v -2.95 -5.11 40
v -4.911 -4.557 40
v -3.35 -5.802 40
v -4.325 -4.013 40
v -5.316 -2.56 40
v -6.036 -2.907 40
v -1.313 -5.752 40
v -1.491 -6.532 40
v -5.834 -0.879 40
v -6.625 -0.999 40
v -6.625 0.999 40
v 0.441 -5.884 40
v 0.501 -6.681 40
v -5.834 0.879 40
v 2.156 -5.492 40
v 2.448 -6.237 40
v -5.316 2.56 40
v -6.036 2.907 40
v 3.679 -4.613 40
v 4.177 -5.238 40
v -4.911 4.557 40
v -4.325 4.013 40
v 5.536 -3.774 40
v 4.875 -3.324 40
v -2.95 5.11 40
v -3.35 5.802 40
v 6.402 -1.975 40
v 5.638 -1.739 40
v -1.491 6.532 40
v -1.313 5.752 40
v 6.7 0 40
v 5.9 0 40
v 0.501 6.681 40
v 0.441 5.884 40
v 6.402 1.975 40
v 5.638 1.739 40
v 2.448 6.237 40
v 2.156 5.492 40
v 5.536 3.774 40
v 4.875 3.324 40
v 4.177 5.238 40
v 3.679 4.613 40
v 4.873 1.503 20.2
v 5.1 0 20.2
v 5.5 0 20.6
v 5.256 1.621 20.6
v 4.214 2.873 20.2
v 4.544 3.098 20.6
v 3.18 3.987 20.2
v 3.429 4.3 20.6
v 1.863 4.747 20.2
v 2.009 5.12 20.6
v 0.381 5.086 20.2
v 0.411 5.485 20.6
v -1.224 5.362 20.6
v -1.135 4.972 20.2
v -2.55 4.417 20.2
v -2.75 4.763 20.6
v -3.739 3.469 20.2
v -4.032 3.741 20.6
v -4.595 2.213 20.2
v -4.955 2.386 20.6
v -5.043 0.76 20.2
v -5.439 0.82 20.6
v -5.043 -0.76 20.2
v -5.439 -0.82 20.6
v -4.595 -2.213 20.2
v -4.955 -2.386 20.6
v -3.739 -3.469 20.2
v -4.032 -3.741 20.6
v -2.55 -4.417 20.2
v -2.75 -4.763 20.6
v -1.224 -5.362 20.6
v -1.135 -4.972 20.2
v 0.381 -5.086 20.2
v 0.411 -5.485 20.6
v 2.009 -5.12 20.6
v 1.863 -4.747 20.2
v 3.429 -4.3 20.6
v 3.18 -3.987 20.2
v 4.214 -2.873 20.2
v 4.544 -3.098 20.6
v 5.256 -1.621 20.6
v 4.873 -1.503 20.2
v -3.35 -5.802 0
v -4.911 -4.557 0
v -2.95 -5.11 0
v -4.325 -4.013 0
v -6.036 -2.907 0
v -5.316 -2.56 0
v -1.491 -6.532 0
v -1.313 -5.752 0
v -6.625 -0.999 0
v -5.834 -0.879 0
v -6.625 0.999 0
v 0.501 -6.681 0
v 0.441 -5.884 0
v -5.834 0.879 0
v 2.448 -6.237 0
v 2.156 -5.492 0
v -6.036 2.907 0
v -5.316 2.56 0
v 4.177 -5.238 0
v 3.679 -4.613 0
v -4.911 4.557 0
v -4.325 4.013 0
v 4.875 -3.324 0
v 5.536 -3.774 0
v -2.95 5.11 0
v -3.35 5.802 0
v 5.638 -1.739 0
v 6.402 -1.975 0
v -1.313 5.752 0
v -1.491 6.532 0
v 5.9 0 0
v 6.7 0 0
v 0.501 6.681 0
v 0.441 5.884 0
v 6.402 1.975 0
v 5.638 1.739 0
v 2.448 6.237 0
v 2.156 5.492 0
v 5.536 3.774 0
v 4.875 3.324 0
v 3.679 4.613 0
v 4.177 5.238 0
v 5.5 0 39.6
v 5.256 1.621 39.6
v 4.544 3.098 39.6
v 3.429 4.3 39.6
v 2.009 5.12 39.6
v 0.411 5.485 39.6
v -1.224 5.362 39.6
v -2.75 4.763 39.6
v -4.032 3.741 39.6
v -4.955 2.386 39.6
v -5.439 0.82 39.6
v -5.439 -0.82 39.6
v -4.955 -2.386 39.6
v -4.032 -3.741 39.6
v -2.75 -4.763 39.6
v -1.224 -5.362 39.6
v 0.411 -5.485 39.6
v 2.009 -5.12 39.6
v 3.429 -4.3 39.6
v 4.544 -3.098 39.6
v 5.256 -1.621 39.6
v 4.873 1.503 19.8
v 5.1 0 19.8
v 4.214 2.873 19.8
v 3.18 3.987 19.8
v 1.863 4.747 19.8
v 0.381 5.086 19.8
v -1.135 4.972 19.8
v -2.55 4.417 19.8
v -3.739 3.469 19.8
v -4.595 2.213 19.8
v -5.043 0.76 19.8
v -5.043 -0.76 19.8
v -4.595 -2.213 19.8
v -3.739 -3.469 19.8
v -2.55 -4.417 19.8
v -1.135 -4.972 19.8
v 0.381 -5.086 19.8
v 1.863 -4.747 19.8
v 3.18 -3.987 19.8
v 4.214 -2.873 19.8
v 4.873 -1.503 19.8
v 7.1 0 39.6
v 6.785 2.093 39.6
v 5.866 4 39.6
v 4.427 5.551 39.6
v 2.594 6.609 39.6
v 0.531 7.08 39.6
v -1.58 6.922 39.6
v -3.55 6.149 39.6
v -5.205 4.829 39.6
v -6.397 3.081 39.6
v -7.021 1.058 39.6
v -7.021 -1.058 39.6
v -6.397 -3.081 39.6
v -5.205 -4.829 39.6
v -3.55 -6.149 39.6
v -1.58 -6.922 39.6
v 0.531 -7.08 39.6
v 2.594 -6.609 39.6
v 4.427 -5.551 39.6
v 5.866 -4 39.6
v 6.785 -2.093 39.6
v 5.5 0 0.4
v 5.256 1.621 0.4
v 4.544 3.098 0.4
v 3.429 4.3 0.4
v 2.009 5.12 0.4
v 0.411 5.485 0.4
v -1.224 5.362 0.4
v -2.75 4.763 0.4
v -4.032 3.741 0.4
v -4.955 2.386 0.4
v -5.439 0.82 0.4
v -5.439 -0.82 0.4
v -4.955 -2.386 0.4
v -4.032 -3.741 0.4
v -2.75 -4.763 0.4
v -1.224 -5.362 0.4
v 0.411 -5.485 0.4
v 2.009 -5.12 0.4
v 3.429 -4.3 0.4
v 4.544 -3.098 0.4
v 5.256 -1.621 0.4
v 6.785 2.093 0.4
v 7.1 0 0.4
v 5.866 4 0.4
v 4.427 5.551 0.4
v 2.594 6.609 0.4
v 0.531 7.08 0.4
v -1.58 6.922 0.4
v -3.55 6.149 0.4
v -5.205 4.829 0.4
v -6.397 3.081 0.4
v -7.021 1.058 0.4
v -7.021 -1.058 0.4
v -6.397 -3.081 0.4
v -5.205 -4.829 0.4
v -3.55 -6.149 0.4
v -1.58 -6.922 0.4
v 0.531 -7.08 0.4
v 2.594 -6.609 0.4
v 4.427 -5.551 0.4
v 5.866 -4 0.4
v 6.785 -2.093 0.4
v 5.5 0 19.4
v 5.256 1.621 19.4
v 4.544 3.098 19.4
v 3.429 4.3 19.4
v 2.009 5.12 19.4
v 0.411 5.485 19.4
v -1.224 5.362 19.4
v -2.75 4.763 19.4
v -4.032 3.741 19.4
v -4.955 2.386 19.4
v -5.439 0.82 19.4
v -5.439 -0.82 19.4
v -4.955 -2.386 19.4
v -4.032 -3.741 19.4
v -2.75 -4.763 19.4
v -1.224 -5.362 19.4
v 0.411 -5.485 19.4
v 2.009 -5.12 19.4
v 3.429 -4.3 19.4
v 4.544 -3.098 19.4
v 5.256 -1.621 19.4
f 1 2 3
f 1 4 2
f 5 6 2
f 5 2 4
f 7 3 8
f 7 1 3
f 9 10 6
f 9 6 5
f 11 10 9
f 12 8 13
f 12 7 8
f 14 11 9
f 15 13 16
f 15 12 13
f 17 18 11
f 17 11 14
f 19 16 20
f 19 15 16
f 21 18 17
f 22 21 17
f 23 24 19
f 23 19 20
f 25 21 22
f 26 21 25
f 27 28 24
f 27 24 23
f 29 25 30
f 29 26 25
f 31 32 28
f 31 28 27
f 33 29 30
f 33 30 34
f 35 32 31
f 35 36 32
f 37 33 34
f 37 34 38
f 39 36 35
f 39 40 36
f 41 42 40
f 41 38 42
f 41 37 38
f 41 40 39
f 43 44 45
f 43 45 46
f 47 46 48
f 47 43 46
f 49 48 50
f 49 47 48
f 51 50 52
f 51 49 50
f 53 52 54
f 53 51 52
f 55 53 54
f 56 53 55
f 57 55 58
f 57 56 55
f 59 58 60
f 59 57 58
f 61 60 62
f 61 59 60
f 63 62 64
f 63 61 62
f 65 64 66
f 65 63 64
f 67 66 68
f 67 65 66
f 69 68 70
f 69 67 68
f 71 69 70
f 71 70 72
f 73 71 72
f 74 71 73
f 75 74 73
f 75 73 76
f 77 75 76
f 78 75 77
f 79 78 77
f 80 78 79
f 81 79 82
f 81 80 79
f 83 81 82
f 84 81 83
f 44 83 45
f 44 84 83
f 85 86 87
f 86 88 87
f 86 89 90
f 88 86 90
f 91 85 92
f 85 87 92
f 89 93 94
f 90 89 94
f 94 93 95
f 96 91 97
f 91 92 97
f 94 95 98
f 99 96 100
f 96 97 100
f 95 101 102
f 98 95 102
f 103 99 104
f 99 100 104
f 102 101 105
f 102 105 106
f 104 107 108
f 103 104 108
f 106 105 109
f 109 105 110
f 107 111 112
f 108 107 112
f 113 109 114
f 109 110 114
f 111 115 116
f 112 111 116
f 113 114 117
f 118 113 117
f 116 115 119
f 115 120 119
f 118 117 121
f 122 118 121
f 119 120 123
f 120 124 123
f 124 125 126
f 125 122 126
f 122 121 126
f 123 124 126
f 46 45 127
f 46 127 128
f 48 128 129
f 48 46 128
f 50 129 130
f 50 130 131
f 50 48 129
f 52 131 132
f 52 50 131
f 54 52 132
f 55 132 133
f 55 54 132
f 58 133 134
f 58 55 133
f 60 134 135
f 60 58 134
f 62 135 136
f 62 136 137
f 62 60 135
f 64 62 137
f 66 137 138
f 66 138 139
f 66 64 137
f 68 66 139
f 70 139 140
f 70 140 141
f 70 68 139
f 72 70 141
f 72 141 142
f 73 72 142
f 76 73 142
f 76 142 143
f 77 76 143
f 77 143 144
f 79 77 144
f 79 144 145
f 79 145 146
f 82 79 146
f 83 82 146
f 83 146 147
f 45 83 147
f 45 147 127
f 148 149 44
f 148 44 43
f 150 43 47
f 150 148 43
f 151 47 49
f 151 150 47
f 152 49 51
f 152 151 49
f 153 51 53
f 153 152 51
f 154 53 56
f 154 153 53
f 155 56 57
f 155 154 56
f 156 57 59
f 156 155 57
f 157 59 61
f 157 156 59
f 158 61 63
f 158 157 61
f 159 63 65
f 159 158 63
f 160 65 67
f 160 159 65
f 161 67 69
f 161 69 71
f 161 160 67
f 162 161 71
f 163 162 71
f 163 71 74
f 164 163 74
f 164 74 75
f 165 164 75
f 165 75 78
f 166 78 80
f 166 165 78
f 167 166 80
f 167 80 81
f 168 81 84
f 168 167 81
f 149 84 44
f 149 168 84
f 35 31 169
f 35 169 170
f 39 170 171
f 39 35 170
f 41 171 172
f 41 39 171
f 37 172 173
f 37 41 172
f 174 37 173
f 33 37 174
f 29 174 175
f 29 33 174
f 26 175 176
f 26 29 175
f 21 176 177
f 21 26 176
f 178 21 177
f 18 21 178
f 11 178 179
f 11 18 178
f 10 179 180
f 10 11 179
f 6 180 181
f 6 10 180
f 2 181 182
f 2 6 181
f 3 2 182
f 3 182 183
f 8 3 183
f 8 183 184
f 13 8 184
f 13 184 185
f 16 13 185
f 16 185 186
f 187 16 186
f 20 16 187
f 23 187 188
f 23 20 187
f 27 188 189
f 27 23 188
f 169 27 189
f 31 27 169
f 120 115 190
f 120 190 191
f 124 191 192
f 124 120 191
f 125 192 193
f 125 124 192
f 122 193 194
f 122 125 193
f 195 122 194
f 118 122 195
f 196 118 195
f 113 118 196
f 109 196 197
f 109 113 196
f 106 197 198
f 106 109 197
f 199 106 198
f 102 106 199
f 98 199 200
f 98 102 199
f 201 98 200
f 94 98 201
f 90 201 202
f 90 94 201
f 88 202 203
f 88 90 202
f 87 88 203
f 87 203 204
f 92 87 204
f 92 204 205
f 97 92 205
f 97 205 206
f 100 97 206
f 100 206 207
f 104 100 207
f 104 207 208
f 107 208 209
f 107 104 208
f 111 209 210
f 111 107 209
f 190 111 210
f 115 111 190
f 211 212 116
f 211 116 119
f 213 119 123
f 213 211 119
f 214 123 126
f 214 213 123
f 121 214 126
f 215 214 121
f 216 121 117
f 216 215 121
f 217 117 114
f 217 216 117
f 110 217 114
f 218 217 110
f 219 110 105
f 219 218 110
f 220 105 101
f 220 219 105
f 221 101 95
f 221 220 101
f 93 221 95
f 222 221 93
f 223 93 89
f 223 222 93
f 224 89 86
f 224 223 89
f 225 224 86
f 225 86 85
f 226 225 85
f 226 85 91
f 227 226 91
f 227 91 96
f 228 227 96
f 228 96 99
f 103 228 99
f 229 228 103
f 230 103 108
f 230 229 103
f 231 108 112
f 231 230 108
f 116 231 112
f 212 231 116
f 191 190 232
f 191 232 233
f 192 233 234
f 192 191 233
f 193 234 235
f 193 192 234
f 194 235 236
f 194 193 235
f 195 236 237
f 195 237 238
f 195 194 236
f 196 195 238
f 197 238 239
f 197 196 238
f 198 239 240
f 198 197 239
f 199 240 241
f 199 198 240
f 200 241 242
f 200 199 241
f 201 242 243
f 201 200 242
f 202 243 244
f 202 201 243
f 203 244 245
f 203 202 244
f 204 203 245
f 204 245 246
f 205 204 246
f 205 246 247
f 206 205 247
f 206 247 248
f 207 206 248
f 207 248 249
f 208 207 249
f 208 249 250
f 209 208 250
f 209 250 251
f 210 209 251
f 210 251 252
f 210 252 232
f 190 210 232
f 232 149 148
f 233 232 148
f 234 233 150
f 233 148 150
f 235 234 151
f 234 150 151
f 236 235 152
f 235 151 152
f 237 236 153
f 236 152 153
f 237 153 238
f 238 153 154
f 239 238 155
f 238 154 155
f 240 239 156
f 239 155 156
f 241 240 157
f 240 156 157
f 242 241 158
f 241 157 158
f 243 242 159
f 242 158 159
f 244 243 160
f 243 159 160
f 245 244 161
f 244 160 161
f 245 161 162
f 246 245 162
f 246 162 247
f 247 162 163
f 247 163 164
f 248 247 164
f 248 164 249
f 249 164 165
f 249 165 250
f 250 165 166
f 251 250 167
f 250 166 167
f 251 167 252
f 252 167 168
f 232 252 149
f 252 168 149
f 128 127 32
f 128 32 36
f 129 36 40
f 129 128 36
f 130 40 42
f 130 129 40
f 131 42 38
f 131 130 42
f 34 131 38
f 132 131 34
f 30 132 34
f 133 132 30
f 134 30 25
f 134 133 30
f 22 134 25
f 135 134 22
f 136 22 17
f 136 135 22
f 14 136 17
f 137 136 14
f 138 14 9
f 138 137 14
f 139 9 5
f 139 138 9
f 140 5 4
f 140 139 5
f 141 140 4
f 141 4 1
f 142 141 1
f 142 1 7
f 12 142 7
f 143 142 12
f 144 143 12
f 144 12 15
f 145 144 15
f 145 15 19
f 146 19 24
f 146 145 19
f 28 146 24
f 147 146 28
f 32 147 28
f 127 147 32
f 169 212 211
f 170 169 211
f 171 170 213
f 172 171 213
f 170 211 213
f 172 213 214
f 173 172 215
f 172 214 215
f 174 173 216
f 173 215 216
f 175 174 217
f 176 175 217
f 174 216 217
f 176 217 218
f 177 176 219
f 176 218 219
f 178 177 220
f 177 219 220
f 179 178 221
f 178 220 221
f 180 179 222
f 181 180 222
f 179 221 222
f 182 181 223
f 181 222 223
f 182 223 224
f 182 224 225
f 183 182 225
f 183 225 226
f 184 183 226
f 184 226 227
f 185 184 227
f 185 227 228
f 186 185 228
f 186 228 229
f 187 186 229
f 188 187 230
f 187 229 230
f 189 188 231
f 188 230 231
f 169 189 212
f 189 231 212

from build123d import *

# Parameters (mm, degrees)
F0_R     = 7.1
F0_R_2   = 5.5
F1_DEPTH = 40
F2_START = 19.8
F0_R_3   = 5.1
F2_DEPTH = 0.4
F3_SIZE  = 0.39999
F4_SIZE  = 0.4


# Not quite as in the source:
# - a fillet or chamfer is up to 0.001 mm smaller than in the source, because OpenCascade refuses the exact size


with BuildPart() as f1:
    # F0 (on Top) → F1 (new body)
    with BuildSketch(Plane.XY):
        Circle(F0_R)
        Circle(F0_R_2, mode=Mode.SUBTRACT)
    extrude(amount=F1_DEPTH)

    # F0 (on Top) → F2 (join)
    with BuildSketch(Plane.XY.offset(F2_START)):
        Circle(F0_R_2)
        Circle(F0_R_3, mode=Mode.SUBTRACT)
    extrude(amount=F2_DEPTH)

    # F3 (size 0.4 in the source; OpenCascade refuses exactly that, so slightly less here)
    f3_edges = [f1.edges().sort_by_distance(p)[0] for p in [
        (-5.5, 0, 19.8),
        (-5.5, 0, 20.2),
    ]]
    chamfer(f3_edges, length=F3_SIZE)

    # F4
    f4_edges = [f1.edges().sort_by_distance(p)[0] for p in [
        (-5.5, 0, 40),
        (-7.1, 0, 40),
        (-5.5, 0, 0),
        (-7.1, 0, 0),
    ]]
    chamfer(f4_edges, length=F4_SIZE)


solid = f1.part
